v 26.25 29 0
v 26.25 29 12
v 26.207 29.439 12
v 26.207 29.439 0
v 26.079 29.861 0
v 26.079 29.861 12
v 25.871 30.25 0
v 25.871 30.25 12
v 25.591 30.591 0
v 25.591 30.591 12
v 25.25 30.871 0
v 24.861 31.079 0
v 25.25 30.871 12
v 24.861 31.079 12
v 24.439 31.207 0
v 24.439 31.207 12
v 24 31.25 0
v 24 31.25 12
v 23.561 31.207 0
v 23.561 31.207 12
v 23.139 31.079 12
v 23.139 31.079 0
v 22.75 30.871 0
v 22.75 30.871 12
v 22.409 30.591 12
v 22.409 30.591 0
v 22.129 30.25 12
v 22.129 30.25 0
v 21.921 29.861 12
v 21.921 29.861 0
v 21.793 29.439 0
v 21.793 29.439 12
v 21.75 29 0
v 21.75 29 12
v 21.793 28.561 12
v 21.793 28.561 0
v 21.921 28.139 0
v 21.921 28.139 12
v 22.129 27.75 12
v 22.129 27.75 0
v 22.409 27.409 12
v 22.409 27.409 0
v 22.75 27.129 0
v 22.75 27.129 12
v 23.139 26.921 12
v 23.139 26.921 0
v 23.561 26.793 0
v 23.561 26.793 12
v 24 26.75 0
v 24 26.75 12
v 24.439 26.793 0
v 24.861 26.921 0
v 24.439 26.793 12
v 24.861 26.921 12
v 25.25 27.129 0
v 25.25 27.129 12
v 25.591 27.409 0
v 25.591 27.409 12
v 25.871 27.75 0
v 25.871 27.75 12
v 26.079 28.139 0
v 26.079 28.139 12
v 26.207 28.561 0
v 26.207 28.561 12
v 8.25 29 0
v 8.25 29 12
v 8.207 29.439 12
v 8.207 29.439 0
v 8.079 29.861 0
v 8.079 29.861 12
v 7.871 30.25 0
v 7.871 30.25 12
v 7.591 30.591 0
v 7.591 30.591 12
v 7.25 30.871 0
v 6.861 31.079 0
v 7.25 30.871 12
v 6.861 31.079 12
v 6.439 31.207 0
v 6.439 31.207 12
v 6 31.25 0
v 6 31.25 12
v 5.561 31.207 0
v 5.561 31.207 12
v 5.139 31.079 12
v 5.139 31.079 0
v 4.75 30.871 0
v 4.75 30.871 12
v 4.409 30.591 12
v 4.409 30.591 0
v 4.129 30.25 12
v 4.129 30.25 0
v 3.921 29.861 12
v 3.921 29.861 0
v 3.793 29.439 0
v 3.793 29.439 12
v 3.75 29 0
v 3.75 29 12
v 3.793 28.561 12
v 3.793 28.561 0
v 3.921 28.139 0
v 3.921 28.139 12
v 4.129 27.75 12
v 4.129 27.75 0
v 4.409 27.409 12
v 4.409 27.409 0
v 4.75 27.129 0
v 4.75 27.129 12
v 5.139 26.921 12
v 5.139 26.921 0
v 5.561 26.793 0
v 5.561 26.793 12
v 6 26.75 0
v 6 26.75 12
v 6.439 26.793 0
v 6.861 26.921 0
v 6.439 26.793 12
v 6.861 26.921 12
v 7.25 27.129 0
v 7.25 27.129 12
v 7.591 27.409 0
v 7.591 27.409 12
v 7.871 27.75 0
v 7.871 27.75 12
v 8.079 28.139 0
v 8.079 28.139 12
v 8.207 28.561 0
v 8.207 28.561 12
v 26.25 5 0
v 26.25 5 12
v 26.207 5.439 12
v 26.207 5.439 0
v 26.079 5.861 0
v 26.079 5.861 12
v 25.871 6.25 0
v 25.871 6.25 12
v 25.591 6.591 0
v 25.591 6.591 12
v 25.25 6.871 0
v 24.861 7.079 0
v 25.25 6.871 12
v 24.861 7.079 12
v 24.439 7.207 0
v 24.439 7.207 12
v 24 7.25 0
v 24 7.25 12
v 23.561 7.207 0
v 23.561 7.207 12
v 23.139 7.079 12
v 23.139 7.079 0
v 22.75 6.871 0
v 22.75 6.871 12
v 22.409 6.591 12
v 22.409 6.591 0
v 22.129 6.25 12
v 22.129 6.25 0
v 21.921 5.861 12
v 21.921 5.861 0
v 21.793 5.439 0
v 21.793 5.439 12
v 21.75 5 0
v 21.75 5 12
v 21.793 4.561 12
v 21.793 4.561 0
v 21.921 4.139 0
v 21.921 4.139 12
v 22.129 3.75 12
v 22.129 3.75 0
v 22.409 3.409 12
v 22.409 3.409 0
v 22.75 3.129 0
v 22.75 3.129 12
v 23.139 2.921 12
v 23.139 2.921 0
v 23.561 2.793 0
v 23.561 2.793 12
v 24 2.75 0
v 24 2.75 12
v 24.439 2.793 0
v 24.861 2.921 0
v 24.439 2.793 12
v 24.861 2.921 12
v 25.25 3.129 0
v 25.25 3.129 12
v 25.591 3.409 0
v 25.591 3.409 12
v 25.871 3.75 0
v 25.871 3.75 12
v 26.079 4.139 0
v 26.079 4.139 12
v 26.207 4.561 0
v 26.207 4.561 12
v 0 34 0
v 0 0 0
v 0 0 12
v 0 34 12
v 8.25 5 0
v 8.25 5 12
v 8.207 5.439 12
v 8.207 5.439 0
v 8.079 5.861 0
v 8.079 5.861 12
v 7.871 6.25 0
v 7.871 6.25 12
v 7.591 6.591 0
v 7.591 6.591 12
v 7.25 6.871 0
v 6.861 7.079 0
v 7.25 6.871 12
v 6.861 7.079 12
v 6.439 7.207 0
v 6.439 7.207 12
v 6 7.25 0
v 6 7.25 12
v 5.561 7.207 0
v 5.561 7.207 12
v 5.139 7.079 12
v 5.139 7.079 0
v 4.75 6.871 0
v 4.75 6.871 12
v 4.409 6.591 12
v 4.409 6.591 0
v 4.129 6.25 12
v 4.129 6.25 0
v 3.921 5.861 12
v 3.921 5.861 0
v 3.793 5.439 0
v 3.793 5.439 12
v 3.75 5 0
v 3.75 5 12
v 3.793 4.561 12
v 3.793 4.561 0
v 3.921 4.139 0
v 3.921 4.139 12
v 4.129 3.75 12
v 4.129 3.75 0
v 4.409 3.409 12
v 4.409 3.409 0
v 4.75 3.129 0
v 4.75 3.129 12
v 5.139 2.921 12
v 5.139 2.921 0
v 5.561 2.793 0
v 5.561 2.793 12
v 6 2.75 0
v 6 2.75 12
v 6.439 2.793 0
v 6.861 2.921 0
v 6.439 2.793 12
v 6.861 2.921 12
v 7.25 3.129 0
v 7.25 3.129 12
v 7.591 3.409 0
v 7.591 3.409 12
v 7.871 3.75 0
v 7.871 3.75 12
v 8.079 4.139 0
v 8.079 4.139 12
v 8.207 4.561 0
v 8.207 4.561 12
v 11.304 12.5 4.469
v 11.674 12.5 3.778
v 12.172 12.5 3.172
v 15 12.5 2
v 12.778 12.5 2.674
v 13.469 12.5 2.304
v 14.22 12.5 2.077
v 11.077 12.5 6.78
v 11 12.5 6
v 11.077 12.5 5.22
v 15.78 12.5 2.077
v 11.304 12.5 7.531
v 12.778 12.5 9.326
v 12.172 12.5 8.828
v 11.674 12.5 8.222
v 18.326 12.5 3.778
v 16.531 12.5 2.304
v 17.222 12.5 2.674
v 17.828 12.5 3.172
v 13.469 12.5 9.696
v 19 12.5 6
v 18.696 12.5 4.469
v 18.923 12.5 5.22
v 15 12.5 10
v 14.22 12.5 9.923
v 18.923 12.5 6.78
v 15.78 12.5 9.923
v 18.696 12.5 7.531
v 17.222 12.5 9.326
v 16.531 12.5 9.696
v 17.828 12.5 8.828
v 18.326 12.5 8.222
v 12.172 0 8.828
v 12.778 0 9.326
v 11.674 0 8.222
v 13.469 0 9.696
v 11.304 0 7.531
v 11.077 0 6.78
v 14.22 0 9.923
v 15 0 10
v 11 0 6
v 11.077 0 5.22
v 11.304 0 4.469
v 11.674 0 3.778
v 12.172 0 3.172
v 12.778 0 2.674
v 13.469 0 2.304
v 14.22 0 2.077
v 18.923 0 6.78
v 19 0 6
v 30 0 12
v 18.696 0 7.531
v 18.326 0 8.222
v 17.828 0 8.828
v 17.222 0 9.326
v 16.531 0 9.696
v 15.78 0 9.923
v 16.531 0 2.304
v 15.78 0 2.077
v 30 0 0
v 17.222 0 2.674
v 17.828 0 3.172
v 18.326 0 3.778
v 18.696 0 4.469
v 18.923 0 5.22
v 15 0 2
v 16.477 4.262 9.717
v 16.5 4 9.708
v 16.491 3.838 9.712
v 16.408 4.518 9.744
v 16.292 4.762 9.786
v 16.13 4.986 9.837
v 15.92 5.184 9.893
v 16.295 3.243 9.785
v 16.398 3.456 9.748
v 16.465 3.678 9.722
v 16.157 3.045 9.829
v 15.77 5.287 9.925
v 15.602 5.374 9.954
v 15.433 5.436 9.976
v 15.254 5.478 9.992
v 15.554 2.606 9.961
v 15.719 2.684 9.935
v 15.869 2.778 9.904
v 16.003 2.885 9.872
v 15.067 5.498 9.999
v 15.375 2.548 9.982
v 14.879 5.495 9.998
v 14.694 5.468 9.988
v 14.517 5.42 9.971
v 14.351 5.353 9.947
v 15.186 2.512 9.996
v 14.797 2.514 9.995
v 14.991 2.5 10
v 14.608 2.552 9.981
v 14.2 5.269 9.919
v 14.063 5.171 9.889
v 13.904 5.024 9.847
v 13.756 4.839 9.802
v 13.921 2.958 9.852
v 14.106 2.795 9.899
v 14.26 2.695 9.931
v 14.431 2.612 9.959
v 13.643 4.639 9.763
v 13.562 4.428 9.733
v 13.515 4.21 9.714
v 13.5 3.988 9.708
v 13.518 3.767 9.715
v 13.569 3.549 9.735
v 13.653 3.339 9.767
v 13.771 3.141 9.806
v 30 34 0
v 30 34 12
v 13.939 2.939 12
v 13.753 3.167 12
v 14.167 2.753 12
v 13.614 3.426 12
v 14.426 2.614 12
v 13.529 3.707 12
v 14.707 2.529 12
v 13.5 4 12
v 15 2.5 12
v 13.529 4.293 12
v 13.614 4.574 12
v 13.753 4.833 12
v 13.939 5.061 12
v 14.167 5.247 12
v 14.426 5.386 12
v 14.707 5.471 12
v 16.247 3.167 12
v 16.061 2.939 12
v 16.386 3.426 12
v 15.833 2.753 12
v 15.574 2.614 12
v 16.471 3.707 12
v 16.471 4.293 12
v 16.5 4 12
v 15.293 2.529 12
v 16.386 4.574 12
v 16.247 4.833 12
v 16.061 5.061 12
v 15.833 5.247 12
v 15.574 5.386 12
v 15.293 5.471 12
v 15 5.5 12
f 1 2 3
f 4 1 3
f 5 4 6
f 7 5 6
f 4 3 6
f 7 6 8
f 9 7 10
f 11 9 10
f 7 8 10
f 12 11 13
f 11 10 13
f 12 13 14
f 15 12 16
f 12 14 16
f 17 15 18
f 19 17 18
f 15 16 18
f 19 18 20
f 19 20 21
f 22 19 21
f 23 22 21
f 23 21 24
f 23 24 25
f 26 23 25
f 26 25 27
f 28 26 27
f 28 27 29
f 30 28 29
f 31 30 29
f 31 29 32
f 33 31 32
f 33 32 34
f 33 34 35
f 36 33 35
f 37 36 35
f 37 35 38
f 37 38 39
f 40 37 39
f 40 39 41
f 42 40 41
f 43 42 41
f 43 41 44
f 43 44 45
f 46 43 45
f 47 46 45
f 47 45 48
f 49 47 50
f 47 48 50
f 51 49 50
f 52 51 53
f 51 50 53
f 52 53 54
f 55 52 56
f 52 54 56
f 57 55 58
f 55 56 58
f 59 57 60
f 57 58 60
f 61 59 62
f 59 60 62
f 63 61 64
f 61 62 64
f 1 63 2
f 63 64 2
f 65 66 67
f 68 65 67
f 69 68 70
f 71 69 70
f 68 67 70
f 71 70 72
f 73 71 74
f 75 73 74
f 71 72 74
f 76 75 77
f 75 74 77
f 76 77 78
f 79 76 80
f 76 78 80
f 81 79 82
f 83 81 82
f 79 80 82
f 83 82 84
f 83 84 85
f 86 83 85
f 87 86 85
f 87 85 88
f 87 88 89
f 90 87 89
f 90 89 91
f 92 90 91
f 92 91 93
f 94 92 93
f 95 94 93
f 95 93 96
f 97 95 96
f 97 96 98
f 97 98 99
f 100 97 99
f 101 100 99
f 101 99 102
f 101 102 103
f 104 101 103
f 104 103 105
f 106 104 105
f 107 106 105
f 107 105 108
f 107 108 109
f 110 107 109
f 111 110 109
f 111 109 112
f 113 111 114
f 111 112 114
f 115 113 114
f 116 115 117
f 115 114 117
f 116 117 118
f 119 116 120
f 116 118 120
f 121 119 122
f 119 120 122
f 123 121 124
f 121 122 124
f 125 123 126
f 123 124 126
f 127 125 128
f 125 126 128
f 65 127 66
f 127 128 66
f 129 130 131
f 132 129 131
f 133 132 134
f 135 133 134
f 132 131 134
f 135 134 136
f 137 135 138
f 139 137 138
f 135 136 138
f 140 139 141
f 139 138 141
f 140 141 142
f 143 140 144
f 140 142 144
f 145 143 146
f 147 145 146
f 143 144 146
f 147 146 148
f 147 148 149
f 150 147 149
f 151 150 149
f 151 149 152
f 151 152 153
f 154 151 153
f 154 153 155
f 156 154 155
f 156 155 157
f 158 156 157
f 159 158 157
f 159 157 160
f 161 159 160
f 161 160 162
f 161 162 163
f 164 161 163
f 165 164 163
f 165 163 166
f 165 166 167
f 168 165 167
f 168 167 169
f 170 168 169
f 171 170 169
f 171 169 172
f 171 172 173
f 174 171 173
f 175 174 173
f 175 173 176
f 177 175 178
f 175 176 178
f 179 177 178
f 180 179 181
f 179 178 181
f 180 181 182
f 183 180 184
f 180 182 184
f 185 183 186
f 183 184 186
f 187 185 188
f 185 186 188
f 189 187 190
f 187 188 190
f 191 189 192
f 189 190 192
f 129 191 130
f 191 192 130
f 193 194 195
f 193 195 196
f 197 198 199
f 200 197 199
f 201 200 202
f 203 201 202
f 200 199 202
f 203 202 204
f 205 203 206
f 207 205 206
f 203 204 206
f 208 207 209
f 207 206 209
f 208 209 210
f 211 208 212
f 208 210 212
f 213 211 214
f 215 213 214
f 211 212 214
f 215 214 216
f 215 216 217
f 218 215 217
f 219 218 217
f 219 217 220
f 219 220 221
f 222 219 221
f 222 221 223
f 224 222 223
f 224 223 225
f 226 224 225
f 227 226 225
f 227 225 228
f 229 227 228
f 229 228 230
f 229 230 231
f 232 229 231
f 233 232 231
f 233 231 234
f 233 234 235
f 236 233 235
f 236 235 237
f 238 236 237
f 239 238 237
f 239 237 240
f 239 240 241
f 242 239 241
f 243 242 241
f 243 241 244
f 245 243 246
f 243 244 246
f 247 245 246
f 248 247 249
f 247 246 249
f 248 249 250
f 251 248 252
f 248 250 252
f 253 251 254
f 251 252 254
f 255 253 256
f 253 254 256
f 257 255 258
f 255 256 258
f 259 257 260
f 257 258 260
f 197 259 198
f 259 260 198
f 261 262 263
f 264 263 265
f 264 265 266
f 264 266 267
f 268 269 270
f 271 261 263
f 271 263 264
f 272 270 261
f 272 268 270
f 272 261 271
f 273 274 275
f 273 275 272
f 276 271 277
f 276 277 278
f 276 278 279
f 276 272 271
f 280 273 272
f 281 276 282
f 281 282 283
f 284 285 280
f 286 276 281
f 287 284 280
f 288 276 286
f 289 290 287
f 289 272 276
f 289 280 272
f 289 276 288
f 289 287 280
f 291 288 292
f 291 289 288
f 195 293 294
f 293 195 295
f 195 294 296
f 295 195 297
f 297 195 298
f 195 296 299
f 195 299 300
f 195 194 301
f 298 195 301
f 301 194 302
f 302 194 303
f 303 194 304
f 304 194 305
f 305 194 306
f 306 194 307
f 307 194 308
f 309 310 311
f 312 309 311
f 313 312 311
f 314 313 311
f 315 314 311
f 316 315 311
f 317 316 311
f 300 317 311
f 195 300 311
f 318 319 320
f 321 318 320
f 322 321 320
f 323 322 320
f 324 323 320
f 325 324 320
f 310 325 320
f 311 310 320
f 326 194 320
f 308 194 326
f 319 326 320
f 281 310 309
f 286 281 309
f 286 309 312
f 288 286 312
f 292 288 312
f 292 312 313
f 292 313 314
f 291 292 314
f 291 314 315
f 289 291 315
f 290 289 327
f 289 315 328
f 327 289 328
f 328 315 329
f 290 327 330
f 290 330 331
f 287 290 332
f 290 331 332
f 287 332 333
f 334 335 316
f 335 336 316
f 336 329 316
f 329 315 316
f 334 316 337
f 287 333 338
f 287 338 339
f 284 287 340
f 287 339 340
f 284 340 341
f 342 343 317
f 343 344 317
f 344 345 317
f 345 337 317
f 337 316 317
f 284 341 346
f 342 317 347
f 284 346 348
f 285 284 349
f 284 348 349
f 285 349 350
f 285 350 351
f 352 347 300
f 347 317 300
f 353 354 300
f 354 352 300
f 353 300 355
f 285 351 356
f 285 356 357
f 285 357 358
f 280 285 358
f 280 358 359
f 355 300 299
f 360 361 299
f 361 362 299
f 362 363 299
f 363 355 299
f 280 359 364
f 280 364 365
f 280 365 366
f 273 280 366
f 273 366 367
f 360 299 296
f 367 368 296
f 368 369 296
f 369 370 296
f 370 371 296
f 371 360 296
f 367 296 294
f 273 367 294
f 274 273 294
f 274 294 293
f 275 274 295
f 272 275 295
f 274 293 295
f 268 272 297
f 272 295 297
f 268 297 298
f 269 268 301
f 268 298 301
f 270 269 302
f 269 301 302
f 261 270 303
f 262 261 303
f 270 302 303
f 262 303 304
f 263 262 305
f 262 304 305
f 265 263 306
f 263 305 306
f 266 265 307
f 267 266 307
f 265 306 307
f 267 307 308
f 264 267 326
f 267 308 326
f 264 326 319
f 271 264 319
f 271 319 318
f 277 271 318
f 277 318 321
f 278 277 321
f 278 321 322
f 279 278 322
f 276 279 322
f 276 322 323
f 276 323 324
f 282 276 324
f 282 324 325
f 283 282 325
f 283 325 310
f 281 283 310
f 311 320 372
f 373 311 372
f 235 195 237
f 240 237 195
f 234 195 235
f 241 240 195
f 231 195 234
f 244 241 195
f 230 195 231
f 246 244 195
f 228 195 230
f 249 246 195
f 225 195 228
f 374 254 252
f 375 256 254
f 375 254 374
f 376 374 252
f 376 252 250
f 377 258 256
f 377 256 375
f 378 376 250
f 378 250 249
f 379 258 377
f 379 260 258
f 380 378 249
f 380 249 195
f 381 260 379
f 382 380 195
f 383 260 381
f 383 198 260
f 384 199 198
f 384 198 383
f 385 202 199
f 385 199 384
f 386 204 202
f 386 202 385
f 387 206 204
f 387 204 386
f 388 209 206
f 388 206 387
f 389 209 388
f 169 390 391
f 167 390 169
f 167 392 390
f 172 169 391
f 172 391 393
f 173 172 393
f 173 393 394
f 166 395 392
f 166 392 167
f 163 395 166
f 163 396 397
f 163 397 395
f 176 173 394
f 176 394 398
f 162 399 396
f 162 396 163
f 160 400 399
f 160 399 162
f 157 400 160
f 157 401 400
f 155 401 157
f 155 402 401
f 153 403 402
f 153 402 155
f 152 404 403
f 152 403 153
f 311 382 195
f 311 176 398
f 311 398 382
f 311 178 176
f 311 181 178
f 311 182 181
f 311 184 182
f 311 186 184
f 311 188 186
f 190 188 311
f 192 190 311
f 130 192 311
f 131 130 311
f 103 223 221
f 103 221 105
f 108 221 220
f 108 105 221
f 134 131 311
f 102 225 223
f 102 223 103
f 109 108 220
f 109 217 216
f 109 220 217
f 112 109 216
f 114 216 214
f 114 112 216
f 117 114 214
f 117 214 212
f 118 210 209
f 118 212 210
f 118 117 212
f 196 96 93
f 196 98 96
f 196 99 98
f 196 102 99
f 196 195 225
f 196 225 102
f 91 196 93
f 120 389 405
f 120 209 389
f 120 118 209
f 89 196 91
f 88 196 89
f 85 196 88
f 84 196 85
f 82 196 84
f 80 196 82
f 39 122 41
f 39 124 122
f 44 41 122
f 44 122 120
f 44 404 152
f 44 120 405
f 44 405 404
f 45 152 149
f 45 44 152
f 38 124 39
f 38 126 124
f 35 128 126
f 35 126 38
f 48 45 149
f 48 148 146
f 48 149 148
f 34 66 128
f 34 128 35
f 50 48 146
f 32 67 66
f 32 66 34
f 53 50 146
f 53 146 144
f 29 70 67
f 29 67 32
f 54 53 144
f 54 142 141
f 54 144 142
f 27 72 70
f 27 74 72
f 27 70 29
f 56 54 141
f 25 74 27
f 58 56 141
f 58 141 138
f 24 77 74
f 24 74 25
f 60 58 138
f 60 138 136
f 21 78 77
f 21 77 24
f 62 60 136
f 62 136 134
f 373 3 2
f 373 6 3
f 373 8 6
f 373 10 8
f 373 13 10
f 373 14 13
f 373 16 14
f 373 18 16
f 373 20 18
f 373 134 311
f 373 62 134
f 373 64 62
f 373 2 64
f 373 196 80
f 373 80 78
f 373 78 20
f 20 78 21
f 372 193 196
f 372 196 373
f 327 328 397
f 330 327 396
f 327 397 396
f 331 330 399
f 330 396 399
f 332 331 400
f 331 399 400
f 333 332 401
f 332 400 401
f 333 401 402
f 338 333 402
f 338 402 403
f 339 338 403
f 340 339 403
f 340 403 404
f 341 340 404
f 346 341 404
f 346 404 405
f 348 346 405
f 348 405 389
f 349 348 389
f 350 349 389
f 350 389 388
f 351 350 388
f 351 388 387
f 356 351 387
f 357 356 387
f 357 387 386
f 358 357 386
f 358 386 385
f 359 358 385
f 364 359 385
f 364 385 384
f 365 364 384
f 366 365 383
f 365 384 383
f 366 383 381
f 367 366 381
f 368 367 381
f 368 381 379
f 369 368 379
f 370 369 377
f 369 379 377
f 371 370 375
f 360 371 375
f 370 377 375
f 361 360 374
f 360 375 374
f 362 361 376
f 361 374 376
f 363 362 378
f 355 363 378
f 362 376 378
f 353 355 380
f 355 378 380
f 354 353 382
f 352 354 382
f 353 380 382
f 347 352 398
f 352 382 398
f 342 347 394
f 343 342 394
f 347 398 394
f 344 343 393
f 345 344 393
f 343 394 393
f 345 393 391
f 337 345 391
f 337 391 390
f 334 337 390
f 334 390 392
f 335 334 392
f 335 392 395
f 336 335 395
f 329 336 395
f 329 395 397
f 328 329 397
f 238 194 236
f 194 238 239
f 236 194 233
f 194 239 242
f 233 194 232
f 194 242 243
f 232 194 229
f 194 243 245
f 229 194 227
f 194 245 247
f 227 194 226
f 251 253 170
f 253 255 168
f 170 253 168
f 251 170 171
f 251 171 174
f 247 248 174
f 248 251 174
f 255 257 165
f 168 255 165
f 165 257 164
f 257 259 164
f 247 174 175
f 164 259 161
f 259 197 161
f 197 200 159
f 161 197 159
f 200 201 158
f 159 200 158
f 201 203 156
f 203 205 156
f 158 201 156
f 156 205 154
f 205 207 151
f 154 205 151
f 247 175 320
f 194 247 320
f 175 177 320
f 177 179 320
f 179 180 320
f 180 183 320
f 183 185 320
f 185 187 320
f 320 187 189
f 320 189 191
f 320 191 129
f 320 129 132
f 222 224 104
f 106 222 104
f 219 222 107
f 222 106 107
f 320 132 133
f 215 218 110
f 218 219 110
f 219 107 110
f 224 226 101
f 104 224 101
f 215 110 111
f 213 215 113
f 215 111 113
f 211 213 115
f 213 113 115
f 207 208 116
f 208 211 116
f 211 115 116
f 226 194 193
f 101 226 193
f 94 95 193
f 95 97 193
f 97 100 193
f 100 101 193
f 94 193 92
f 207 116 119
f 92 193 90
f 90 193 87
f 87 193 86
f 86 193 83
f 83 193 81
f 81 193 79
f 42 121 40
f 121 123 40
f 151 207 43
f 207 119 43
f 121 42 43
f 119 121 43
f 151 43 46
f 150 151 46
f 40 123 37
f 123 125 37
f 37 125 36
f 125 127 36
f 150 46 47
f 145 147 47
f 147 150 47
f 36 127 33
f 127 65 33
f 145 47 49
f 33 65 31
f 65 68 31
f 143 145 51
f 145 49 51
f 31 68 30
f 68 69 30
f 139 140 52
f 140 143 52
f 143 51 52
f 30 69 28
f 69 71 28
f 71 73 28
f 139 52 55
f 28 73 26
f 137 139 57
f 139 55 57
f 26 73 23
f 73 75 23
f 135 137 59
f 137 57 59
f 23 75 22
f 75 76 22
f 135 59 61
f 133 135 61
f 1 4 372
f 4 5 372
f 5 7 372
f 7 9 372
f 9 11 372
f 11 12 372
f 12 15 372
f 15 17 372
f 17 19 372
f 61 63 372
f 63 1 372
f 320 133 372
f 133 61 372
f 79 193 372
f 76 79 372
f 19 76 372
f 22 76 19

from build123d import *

# Parameters (mm, degrees)
F0_W     = 30
F0_H     = 34
F1_DEPTH = 12
F2_R     = 2.25
F3_DEPTH = 12.001
F4_R     = 4
F5_DEPTH = 12.5
F6_R     = 1.5
F7_DEPTH = 6


with BuildPart() as f1:
    # F0 (on Top) → F1 (new body)
    with BuildSketch(Plane.XY):
        with Locations((15, 17)):
            Rectangle(F0_W, F0_H)
    extrude(amount=F1_DEPTH)

    # F2 (on face) → F3 (cut, through all)
    with BuildSketch(Plane.XY.offset(12)):
        with Locations((6, 29)):
            Circle(F2_R)
        with Locations((24, 29)):
            Circle(F2_R)
        with Locations((24, 5)):
            Circle(F2_R)
        with Locations((6, 5)):
            Circle(F2_R)
    extrude(amount=-F3_DEPTH, mode=Mode.SUBTRACT)

    # F4 (on face) → F5 (cut)
    with BuildSketch(Plane.XZ):
        with Locations((15, 6)):
            Circle(F4_R)
    extrude(amount=-F5_DEPTH, mode=Mode.SUBTRACT)

    # F6 (on face) → F7 (cut)
    with BuildSketch(Plane.XY.offset(12)):
        with Locations((15, 4)):
            Circle(F6_R)
    extrude(amount=-F7_DEPTH, mode=Mode.SUBTRACT)


solid = f1.part
